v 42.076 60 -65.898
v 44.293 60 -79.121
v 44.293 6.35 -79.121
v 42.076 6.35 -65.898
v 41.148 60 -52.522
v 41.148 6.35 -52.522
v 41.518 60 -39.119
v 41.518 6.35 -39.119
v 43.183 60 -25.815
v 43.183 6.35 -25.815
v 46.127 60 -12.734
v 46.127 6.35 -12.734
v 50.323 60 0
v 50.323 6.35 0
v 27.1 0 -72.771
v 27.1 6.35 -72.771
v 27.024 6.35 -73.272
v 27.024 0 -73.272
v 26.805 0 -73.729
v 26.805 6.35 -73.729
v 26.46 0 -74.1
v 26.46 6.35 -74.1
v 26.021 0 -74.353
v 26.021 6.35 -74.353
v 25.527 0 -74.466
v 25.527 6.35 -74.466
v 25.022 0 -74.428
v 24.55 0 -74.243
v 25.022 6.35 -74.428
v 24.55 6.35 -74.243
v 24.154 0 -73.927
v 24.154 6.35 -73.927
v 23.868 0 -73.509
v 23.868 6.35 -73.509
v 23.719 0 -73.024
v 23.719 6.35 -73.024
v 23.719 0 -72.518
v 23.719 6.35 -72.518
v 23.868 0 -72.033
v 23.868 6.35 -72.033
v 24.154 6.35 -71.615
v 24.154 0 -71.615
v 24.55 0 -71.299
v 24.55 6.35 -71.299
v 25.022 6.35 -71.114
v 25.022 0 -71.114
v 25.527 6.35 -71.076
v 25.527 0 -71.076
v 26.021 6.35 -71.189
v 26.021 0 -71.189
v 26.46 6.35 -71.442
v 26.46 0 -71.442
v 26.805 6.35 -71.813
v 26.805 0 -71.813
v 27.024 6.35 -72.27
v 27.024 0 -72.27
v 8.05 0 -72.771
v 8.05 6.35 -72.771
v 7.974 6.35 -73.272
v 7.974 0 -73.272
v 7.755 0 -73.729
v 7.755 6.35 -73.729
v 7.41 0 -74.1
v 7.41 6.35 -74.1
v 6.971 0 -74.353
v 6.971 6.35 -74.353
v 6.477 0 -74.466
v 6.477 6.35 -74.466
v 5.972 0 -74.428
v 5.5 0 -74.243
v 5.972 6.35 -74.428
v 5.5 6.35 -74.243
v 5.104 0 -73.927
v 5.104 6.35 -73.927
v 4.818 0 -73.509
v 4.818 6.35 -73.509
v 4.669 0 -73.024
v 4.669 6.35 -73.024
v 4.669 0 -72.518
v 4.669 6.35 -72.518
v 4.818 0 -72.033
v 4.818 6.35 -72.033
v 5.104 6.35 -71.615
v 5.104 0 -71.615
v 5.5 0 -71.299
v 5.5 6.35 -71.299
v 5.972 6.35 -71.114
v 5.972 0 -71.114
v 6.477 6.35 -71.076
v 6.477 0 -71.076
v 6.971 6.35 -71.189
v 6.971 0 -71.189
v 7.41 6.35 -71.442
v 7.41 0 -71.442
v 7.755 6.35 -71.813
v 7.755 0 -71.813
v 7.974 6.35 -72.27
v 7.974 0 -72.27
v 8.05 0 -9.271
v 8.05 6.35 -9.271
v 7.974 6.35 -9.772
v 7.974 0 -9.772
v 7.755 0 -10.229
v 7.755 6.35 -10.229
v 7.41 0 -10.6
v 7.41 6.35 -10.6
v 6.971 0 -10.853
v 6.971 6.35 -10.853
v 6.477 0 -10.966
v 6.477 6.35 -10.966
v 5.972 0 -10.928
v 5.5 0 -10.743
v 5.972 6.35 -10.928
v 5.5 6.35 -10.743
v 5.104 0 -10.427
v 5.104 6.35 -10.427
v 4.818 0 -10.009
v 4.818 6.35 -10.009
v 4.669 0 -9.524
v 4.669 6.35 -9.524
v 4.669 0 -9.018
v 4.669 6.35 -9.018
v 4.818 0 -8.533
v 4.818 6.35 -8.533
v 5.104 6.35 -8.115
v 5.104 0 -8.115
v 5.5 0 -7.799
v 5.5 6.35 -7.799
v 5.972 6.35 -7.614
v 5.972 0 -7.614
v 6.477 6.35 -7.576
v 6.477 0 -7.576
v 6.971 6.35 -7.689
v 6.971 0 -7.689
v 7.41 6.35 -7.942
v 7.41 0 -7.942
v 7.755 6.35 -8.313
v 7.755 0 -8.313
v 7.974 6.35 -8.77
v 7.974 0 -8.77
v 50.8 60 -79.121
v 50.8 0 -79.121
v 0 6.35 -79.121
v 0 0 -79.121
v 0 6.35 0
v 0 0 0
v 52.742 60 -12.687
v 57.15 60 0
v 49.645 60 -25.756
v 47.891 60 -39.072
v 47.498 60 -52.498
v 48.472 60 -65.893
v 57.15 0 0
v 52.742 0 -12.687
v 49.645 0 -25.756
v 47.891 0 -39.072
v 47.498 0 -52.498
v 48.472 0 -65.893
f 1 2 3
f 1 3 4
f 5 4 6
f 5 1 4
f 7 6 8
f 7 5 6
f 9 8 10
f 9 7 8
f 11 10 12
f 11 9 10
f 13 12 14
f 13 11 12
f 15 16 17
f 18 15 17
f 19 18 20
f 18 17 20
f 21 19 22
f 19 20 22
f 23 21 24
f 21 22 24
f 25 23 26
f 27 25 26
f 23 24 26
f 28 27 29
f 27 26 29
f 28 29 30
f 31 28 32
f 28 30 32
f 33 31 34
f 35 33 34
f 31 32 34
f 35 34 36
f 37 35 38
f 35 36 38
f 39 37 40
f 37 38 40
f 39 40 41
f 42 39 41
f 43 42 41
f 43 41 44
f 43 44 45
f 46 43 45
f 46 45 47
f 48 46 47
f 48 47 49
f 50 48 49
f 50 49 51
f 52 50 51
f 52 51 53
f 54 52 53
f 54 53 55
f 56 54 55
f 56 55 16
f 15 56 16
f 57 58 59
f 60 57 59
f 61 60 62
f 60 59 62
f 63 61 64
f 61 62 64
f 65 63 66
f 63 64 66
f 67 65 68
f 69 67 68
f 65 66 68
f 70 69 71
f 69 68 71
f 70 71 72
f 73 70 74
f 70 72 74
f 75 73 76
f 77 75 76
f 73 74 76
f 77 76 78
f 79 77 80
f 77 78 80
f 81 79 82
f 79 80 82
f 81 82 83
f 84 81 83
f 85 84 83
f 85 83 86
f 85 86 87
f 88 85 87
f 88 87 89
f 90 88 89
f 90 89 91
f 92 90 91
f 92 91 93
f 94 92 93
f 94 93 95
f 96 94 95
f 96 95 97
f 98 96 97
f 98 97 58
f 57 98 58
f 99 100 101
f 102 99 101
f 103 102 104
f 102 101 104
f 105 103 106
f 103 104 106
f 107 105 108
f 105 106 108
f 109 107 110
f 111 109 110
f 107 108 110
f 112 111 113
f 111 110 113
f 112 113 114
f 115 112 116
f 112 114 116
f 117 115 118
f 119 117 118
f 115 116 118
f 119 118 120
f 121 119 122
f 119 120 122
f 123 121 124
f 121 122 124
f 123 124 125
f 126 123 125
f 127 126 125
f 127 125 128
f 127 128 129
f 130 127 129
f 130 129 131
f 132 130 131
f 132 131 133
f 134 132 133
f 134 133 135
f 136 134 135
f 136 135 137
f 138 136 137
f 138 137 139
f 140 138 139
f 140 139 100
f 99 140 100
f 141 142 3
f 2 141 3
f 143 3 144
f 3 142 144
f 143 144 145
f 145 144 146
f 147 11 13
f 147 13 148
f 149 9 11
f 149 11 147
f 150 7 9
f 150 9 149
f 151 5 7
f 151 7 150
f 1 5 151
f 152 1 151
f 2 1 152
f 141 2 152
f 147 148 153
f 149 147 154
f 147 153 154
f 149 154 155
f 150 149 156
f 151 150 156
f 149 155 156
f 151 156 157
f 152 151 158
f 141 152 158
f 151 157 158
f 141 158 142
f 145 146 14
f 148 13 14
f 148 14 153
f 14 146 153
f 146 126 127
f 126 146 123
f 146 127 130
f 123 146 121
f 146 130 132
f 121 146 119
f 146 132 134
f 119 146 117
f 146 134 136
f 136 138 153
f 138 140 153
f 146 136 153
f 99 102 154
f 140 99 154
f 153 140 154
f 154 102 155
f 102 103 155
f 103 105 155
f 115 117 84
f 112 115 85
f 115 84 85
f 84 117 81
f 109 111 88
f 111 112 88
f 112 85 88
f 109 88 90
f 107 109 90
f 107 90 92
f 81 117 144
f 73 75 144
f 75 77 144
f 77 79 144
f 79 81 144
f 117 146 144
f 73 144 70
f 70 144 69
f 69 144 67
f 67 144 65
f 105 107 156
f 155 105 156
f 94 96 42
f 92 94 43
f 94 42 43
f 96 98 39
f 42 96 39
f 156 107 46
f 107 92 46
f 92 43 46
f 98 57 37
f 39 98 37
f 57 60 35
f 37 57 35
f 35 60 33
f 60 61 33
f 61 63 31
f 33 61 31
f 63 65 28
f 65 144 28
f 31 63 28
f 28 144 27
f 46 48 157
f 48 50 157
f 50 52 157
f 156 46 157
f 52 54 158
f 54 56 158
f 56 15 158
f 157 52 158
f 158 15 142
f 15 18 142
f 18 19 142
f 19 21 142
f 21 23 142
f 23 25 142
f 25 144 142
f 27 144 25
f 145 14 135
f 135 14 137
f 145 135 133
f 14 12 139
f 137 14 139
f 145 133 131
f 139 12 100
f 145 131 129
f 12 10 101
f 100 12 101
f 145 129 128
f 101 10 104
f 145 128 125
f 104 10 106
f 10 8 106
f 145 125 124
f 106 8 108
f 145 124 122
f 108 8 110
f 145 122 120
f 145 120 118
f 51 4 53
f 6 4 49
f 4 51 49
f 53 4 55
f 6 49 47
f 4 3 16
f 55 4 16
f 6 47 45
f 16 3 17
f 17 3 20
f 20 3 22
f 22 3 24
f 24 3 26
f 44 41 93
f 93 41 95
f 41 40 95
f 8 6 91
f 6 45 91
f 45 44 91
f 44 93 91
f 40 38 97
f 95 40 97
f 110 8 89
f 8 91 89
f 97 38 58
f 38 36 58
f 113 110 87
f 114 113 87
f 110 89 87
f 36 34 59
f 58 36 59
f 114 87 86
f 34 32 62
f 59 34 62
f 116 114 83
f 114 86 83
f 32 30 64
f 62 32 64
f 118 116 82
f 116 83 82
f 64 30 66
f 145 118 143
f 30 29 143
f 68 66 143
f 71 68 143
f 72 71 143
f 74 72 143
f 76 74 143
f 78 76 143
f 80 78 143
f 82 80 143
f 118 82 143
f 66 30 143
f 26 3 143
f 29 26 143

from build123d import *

# Parameters (mm, degrees)
BOSS_EXTRUDE1_DEPTH = 59.999999888
CUT_EXTRUDE1_START  = 60
CUT_EXTRUDE1_DEPTH  = 53.65
SKETCH4_R           = 1.700000029
CUT_EXTRUDE2_DEPTH  = 7.35


with BuildPart() as part:
    # Sketch1 → Boss-Extrude1 (new body)
    with BuildSketch(Plane(origin=(0, 0, 0), x_dir=(1, 0, 0), z_dir=(0, 1, 0))):
        with BuildLine():
            Line((50.8, 79.121), (0, 79.121))
            Line((0, 79.121), (0, 0))
            Line((0, 0), (57.15, 0))
            ThreePointArc((57.15, 0), (47.890801483, 39.072201564), (50.8, 79.121))
        make_face()
    extrude(amount=BOSS_EXTRUDE1_DEPTH)

    # Sketch3 → Cut-Extrude1 (cut)
    with BuildSketch(Plane(origin=(0, 0, 0), x_dir=(1, 0, 0), z_dir=(0, 1, 0)).offset(CUT_EXTRUDE1_START)):
        with BuildLine():
            Line((51.265506183, -2.386468628), (0, 0))
            Line((0, 0), (0, 79.121))
            Line((0, 79.121), (44.293451527, 79.121))
            ThreePointArc((44.293451527, 79.121), (41.621147879, 37.840489172), (51.265506183, -2.386468628))
        make_face()
    extrude(amount=-CUT_EXTRUDE1_DEPTH, mode=Mode.SUBTRACT)

    # Sketch4 → Cut-Extrude2 (cut, through all)
    with BuildSketch(Plane(origin=(0, 6.35, 0), x_dir=(1, 0, 0), z_dir=(0, 1, 0))):
        with Locations((6.35, 72.771)):
            Circle(SKETCH4_R)
        with Locations((25.4, 72.771)):
            Circle(SKETCH4_R)
        with Locations((6.35, 9.271)):
            Circle(SKETCH4_R)
    extrude(amount=-CUT_EXTRUDE2_DEPTH, mode=Mode.SUBTRACT)


solid = part.part
